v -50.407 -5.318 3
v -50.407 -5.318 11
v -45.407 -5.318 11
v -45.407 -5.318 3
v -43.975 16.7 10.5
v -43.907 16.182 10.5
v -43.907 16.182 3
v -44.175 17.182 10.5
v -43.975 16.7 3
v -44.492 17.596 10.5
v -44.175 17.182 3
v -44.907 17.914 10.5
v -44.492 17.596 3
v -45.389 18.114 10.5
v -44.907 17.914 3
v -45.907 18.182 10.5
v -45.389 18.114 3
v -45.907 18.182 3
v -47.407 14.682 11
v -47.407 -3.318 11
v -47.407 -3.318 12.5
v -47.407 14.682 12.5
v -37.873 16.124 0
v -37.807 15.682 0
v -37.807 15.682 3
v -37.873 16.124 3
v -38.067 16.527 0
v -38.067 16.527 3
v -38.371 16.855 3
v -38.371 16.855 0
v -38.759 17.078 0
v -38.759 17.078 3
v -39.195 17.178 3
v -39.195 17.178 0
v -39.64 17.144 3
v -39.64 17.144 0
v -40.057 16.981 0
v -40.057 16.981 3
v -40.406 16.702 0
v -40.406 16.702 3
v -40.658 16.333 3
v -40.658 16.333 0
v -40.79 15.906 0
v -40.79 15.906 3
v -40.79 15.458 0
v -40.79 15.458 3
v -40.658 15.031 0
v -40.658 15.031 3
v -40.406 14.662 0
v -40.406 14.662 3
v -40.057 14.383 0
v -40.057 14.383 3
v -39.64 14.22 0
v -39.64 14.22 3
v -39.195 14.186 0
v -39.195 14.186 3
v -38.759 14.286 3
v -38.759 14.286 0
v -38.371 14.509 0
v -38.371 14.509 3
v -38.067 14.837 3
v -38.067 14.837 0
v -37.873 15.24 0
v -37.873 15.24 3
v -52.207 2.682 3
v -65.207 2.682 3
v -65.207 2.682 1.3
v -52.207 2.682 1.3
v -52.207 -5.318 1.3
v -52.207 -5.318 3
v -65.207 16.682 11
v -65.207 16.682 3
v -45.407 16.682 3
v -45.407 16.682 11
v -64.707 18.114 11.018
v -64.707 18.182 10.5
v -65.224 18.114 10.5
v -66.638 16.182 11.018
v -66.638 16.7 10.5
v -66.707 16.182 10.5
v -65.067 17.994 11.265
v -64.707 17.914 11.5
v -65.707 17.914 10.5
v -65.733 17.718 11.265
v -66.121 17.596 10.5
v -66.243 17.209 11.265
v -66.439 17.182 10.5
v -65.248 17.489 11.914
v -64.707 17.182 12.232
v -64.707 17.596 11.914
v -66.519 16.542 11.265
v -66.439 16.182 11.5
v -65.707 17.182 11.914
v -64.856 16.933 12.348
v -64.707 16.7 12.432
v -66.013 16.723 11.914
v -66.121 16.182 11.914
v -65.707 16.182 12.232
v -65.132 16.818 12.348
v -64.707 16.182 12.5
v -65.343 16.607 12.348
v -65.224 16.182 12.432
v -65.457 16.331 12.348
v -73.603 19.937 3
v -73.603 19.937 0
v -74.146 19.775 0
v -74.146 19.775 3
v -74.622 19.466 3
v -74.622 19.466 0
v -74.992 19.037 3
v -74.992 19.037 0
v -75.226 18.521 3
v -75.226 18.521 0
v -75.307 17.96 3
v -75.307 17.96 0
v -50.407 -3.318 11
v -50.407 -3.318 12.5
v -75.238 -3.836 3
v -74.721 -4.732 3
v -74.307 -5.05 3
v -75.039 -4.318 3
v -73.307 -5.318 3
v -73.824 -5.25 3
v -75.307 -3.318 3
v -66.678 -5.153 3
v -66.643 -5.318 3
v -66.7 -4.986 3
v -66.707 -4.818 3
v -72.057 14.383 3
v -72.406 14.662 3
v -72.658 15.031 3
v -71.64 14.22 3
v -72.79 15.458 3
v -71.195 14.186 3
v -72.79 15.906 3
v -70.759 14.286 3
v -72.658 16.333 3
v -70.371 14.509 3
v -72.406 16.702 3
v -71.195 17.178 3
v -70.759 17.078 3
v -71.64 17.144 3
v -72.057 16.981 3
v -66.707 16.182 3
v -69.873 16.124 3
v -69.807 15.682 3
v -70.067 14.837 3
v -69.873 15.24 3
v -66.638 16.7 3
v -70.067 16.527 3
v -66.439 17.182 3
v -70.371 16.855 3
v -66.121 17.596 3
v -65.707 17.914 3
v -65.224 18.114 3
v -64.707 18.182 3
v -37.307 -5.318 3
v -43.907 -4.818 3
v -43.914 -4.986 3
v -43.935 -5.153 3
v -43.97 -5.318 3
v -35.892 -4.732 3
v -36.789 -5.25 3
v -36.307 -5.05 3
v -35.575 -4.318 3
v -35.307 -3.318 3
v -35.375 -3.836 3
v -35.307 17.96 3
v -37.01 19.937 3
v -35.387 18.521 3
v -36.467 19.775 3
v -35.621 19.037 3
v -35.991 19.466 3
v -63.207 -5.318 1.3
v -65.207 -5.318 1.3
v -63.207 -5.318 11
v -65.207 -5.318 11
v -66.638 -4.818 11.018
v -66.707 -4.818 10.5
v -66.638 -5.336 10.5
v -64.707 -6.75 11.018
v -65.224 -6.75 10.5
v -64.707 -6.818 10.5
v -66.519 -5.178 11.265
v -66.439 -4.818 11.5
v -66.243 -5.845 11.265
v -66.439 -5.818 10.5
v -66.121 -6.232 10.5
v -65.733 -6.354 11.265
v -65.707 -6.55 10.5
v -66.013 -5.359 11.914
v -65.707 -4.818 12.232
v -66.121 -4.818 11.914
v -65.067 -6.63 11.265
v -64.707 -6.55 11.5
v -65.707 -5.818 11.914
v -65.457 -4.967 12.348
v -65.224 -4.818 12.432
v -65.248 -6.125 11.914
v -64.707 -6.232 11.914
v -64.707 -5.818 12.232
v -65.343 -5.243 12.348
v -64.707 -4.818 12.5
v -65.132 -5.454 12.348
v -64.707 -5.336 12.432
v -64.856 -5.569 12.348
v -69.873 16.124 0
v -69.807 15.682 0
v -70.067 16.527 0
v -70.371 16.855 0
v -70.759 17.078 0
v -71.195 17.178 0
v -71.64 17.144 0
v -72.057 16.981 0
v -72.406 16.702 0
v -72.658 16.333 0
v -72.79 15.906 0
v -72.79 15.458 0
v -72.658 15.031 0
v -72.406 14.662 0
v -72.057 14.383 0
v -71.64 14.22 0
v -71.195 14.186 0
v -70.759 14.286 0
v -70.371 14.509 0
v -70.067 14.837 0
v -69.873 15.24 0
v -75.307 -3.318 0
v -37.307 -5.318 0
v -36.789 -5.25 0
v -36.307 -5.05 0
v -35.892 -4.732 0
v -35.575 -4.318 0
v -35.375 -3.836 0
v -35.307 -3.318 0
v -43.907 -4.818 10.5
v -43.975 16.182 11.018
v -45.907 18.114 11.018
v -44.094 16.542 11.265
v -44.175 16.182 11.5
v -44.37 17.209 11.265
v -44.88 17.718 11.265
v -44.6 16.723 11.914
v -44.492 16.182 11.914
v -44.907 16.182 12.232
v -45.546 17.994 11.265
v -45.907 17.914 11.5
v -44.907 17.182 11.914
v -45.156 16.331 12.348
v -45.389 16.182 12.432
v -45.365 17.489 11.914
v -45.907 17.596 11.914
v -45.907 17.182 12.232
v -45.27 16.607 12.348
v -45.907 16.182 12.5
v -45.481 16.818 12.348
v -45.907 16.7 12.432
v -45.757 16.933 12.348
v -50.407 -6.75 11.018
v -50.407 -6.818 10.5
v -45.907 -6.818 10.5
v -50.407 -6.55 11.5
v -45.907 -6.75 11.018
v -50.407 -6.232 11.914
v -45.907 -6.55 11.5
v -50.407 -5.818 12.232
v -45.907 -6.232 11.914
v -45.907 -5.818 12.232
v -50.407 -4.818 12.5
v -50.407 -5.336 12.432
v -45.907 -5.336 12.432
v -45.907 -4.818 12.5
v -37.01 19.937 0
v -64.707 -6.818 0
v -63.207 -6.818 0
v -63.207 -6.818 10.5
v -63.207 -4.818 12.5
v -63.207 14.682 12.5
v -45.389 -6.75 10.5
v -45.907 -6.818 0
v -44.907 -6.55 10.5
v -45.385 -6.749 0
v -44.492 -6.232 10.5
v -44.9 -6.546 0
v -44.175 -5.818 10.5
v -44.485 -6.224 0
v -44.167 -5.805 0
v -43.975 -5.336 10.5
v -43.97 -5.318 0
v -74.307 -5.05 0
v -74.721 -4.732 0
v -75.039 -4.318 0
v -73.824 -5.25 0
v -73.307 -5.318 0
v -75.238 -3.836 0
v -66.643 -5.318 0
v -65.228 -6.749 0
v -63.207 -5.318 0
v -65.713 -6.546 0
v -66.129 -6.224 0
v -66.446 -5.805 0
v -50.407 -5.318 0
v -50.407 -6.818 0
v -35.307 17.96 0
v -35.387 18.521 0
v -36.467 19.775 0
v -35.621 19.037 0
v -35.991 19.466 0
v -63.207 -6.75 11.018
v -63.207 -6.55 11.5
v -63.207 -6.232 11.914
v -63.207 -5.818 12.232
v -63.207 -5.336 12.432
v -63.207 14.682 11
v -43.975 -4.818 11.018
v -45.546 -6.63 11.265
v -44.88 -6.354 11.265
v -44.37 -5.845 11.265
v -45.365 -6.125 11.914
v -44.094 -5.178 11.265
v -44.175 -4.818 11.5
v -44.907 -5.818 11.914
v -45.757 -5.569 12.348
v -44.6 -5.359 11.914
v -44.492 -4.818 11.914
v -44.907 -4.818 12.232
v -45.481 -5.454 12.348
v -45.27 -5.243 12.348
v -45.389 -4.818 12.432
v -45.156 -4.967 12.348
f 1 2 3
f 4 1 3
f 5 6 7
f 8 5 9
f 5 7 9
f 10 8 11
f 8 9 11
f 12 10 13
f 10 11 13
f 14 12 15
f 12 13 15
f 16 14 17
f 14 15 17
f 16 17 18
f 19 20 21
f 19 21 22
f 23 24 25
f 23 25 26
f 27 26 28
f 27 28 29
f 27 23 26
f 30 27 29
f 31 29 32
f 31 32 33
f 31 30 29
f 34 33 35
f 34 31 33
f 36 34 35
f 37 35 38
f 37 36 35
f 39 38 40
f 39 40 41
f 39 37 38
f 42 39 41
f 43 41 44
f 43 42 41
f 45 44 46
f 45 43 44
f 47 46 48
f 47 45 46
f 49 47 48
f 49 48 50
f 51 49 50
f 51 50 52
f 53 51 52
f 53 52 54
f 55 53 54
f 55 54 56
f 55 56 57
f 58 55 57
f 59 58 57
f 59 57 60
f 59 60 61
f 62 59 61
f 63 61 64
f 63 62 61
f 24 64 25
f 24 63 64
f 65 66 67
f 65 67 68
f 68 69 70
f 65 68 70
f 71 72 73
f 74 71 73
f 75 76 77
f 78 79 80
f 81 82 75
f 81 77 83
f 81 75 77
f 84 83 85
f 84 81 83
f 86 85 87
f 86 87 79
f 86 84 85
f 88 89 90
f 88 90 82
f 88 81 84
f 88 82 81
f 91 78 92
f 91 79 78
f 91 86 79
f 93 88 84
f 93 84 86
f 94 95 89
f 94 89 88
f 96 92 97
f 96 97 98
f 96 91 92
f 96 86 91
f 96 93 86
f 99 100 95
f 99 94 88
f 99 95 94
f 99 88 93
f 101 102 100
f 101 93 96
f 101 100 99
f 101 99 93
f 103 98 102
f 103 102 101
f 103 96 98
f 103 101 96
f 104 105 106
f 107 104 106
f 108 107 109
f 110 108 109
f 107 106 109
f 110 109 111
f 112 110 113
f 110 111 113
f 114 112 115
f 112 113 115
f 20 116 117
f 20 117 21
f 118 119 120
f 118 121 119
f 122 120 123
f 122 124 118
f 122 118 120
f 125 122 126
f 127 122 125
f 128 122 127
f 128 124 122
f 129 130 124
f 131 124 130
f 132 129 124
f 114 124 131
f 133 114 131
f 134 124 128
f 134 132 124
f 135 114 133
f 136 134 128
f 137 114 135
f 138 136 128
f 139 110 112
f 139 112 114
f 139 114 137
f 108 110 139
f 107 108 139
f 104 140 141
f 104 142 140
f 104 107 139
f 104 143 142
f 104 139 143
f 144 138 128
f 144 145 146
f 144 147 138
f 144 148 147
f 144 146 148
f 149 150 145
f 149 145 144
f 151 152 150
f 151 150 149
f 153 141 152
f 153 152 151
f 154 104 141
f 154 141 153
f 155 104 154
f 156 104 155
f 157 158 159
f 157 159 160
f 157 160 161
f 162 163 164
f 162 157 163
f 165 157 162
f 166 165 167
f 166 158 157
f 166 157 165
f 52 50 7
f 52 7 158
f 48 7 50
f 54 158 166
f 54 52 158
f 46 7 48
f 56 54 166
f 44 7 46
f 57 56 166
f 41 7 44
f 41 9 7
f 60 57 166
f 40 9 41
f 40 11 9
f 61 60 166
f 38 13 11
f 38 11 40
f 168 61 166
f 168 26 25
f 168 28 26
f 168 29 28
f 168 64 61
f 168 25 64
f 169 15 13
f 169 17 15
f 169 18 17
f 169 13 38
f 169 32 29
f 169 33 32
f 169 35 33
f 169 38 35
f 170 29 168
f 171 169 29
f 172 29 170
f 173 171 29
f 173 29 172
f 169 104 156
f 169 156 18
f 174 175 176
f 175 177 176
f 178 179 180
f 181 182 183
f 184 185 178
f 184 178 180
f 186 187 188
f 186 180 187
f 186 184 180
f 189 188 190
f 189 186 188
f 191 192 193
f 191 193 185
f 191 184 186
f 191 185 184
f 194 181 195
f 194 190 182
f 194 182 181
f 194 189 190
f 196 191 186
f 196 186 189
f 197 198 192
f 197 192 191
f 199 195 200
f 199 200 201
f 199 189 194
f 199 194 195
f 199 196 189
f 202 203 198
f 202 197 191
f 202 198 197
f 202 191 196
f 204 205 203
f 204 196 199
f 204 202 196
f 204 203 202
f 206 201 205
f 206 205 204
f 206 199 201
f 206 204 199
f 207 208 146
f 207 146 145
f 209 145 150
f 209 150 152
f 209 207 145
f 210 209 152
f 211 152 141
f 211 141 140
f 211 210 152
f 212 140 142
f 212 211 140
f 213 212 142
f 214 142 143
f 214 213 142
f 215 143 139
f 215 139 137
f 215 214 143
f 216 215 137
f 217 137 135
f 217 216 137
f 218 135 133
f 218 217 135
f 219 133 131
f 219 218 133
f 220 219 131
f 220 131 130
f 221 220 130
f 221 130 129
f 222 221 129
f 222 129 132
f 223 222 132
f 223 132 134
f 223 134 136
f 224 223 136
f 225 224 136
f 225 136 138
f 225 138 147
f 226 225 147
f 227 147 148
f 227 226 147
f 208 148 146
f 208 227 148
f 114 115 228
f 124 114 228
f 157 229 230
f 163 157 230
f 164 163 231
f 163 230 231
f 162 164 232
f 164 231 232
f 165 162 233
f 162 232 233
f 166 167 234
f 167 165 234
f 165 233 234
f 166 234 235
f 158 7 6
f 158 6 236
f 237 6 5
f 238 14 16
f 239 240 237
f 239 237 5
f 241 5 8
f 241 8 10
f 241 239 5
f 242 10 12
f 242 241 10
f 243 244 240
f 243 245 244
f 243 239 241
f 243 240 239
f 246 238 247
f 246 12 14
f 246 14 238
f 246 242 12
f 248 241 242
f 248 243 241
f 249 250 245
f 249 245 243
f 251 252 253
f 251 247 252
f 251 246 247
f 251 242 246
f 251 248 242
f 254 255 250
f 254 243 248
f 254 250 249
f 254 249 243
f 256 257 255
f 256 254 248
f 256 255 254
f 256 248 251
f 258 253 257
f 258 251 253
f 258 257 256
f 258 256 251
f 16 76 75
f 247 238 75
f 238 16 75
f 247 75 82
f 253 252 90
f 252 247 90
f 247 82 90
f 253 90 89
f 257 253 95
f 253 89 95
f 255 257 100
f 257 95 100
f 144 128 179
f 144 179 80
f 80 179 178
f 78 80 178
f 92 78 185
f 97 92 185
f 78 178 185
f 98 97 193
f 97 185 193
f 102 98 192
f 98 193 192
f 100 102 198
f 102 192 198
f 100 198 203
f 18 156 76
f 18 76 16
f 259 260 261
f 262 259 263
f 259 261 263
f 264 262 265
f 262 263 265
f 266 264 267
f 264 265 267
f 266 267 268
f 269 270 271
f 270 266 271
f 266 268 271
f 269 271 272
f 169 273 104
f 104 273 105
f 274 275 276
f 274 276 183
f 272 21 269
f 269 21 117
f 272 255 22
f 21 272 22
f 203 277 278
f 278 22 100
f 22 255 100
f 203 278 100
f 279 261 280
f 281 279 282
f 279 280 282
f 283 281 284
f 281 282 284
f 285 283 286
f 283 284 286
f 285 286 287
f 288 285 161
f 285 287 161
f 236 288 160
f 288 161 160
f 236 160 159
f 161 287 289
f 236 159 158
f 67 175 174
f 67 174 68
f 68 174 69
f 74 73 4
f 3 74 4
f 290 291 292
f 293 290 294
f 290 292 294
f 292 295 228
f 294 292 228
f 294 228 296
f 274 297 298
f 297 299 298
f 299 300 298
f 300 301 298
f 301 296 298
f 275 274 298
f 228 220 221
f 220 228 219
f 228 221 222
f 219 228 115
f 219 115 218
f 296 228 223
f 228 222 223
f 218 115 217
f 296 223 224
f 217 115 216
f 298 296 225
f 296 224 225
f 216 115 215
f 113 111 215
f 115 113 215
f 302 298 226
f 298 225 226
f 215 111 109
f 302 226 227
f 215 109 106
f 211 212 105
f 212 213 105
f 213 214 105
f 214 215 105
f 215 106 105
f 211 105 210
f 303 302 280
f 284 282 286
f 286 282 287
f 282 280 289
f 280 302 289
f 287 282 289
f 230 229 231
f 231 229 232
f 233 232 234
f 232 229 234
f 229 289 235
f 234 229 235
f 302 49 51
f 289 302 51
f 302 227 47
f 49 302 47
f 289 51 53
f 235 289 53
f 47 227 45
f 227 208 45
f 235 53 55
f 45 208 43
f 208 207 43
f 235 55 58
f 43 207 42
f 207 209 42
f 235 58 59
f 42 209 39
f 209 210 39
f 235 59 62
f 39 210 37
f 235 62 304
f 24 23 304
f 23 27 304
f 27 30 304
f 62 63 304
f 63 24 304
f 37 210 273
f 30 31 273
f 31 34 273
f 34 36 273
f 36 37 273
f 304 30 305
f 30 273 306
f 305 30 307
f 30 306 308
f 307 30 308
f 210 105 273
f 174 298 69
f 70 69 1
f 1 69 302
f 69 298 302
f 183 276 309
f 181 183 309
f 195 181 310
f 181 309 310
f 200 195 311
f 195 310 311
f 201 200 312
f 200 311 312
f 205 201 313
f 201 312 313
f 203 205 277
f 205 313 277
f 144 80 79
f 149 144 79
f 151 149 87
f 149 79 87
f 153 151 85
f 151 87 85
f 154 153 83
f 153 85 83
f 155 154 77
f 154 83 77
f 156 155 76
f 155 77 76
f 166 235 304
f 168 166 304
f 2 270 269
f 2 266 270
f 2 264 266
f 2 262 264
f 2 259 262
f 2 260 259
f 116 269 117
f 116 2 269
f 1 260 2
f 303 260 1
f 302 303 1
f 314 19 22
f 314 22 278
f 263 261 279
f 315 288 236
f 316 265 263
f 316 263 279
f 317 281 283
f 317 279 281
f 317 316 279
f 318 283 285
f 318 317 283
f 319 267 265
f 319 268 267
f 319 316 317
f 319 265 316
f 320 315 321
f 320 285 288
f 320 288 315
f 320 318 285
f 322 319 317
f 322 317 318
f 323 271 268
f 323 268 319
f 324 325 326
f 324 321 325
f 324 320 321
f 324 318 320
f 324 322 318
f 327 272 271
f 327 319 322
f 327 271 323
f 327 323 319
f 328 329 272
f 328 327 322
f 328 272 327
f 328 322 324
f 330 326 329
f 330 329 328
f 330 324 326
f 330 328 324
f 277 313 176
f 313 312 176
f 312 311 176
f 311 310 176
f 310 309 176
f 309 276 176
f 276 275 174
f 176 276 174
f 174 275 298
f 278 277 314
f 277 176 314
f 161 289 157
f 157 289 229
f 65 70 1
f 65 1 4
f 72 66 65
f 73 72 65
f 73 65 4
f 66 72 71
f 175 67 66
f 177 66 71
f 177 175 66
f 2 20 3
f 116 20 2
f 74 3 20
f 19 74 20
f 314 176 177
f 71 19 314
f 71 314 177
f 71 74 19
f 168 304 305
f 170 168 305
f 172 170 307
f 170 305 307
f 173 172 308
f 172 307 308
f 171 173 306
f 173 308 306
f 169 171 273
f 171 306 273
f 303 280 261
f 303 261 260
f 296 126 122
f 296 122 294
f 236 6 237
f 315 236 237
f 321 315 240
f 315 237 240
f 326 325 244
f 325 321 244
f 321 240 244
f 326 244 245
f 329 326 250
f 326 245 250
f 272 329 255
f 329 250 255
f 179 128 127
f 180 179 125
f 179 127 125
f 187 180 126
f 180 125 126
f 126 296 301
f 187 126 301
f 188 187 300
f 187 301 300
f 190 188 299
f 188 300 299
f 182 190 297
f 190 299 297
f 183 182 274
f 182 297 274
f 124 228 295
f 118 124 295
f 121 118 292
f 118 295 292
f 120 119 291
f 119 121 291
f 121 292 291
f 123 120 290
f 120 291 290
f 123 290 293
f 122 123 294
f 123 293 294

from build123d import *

# Parameters (mm, degrees)
CROQUIS1_R              = 1.5
SALIENTE_EXTRUIR1_DEPTH = 3
SALIENTE_EXTRUIR2_DEPTH = 8
CROQUIS3_W              = 13
CROQUIS3_H              = 1.7
CORTAR_EXTRUIR1_DEPTH   = 8
CROQUIS5_W              = 3.5
CROQUIS5_H              = 11
CROQUIS5_W_2            = 6.5
SALIENTE_EXTRUIR3_DEPTH = 1.5
SALIENTE_EXTRUIR4_DEPTH = 1.5
REDONDEO1_R             = 2


with BuildPart() as part:
    # Croquis1 → Saliente-Extruir1 (new body)
    with BuildSketch(Plane.XY):
        with BuildLine():
            Line((-75.306602598, 17.959617496), (-75.306602598, -5.318007663))
            Line((-75.306602598, -5.318007663), (-35.306602598, -5.318007663))
            Line((-35.306602598, -5.318007663), (-35.306602598, 17.959617496))
            ThreePointArc((-35.306602598, 17.959617496), (-35.791122177, 19.26473017), (-37.009921692, 19.937490201))
            Line((-37.009921692, 19.937490201), (-73.603283504, 19.937490201))
            ThreePointArc((-73.603283504, 19.937490201), (-74.822083019, 19.26473017), (-75.306602598, 17.959617496))
        make_face()
        with Locations((-71.306602598, 15.681992337)):
            Circle(CROQUIS1_R, mode=Mode.SUBTRACT)
        with Locations((-39.306602598, 15.681992337)):
            Circle(CROQUIS1_R, mode=Mode.SUBTRACT)
    extrude(amount=SALIENTE_EXTRUIR1_DEPTH)

    # Croquis2 → Saliente-Extruir2 (add)
    with BuildSketch(Plane.XY.offset(3)):
        Polygon((-66.706602598, -5.318007663), (-65.206602598, -5.318007663), (-65.206602598, 16.681992337), (-45.406602598, 16.681992337), (-45.406602598, -5.318007663), (-43.906602598, -5.318007663), (-43.906602598, 18.181992337), (-66.706602598, 18.181992337), align=None)
    extrude(amount=SALIENTE_EXTRUIR2_DEPTH)

    # Croquis3 → Cortar-Extruir1 (cut)
    with BuildSketch(Plane.XZ.offset(5.318007663)):
        with Locations((-58.706602598, 2.15)):
            Rectangle(CROQUIS3_W, CROQUIS3_H)
    extrude(amount=-CORTAR_EXTRUIR1_DEPTH, mode=Mode.SUBTRACT)

    # Croquis5 → Saliente-Extruir3 (add)
    with BuildSketch(Plane.XZ.offset(5.318007663)):
        with Locations((-64.956602598, 5.5)):
            Rectangle(CROQUIS5_W, CROQUIS5_H)
        with Locations((-47.156602598, 5.5)):
            Rectangle(CROQUIS5_W_2, CROQUIS5_H)
    extrude(amount=SALIENTE_EXTRUIR3_DEPTH)

    # Croquis6 → Saliente-Extruir4 (add)
    with BuildSketch(Plane.XY.offset(11)):
        Polygon((-63.206602598, -5.318007663), (-63.206602598, -6.818007663), (-66.706602598, -6.818007663), (-66.706602598, 18.181992337), (-43.906602598, 18.181992337), (-43.906602598, -6.818007663), (-50.406602598, -6.818007663), (-50.406602598, -3.318007663), (-47.406602598, -3.318007663), (-47.406602598, 14.681992337), (-63.206602598, 14.681992337), align=None)
    extrude(amount=SALIENTE_EXTRUIR4_DEPTH)

    # Redondeo1
    # the kernel refuses this fillet: 2 mm, written as the material it takes off along each edge
    with BuildSketch(Plane(origin=(-45.906602598, -4.818007663, 10.5), x_dir=(1, 0, 0), z_dir=(0, 0, 1))) as redondeo1_piece_1_section:
        Polygon((0, 0), (REDONDEO1_R * 1.02, 0), (REDONDEO1_R * 1.02, -REDONDEO1_R * 1.02), (0, -REDONDEO1_R * 1.02), align=None)
    redondeo1_piece_1 = extrude(amount=REDONDEO1_R * 1.02, mode=Mode.PRIVATE)
    redondeo1_piece_1 = redondeo1_piece_1 - Plane(origin=(-45.906602598, -4.818007663, 10.5), x_dir=(-0.7071067811865477, 0.7071067811865474, 0), z_dir=(0, 0, 1)) * Sphere(REDONDEO1_R, mode=Mode.PRIVATE)
    add(redondeo1_piece_1, mode=Mode.SUBTRACT)
    with BuildSketch(Plane(origin=(-45.906602598, 16.181992337, 10.5), x_dir=(0, 1, 0), z_dir=(0, 0, 1))) as redondeo1_piece_2_section:
        Polygon((0, 0), (REDONDEO1_R * 1.02, 0), (REDONDEO1_R * 1.02, -REDONDEO1_R * 1.02), (0, -REDONDEO1_R * 1.02), align=None)
    redondeo1_piece_2 = extrude(amount=REDONDEO1_R * 1.02, mode=Mode.PRIVATE)
    redondeo1_piece_2 = redondeo1_piece_2 - Plane(origin=(-45.906602598, 16.181992337, 10.5), x_dir=(-0.7071067811865471, -0.7071067811865477, 0), z_dir=(0, 0, 1)) * Sphere(REDONDEO1_R, mode=Mode.PRIVATE)
    add(redondeo1_piece_2, mode=Mode.SUBTRACT)
    with BuildSketch(Plane(origin=(-64.706602598, 16.181992337, 10.5), x_dir=(0, 1, 0), z_dir=(0, 0, 1))) as redondeo1_piece_3_section:
        Polygon((0, 0), (REDONDEO1_R * 1.02, 0), (REDONDEO1_R * 1.02, REDONDEO1_R * 1.02), (0, REDONDEO1_R * 1.02), align=None)
    redondeo1_piece_3 = extrude(amount=REDONDEO1_R * 1.02, mode=Mode.PRIVATE)
    redondeo1_piece_3 = redondeo1_piece_3 - Plane(origin=(-64.706602598, 16.181992337, 10.5), x_dir=(0.7071067811865477, -0.7071067811865475, 0), z_dir=(0, 0, 1)) * Sphere(REDONDEO1_R, mode=Mode.PRIVATE)
    add(redondeo1_piece_3, mode=Mode.SUBTRACT)
    with BuildSketch(Plane(origin=(-64.706602598, -4.818007663, 10.5), x_dir=(-1, 0, 0), z_dir=(0, 0, 1))) as redondeo1_piece_4_section:
        Polygon((0, 0), (REDONDEO1_R * 1.02, 0), (REDONDEO1_R * 1.02, REDONDEO1_R * 1.02), (0, REDONDEO1_R * 1.02), align=None)
    redondeo1_piece_4 = extrude(amount=REDONDEO1_R * 1.02, mode=Mode.PRIVATE)
    redondeo1_piece_4 = redondeo1_piece_4 - Plane(origin=(-64.706602598, -4.818007663, 10.5), x_dir=(0.7071067811865475, 0.7071067811865475, 0), z_dir=(0, 0, 1)) * Sphere(REDONDEO1_R, mode=Mode.PRIVATE)
    add(redondeo1_piece_4, mode=Mode.SUBTRACT)
    with BuildSketch(Plane(origin=(-35.306602598, -5.318007663, -5), x_dir=(-1, 0, 0), z_dir=(0, 0, 1))) as redondeo1_piece_5:
        with BuildLine():
            CenterArc((REDONDEO1_R, -REDONDEO1_R), REDONDEO1_R, 90, 90)
            Line((0, -REDONDEO1_R), (0, 0))
            Line((0, 0), (REDONDEO1_R, 0))
        make_face()
    extrude(amount=13, mode=Mode.SUBTRACT)
    with BuildSketch(Plane(origin=(-45.906602598, -6.818007663, 12.5), x_dir=(0, 0, -1), z_dir=(-1, 0, 0))) as redondeo1_piece_6:
        with BuildLine():
            CenterArc((REDONDEO1_R, -REDONDEO1_R), REDONDEO1_R, 90, 90)
            Line((0, -REDONDEO1_R), (0, 0))
            Line((0, 0), (REDONDEO1_R, 0))
        make_face()
    extrude(amount=9.5, mode=Mode.SUBTRACT)
    with BuildSketch(Plane(origin=(-43.906602598, 16.181992337, 12.5), x_dir=(-1, 0, 0), z_dir=(0, -1, 0))) as redondeo1_piece_7:
        with BuildLine():
            CenterArc((REDONDEO1_R, REDONDEO1_R), REDONDEO1_R, 180, 90)
            Line((0, REDONDEO1_R), (0, 0))
            Line((0, 0), (REDONDEO1_R, 0))
        make_face()
    extrude(amount=21, mode=Mode.SUBTRACT)
    with BuildSketch(Plane(origin=(-64.706602598, 18.181992337, 12.5), x_dir=(0, -1, 0), z_dir=(1, 0, 0))) as redondeo1_piece_8:
        with BuildLine():
            CenterArc((REDONDEO1_R, REDONDEO1_R), REDONDEO1_R, 180, 90)
            Line((0, REDONDEO1_R), (0, 0))
            Line((0, 0), (REDONDEO1_R, 0))
        make_face()
    extrude(amount=18.8, mode=Mode.SUBTRACT)
    with BuildSketch(Plane(origin=(-75.306602598, -5.318007663, -5), x_dir=(1, 0, 0), z_dir=(0, 0, 1))) as redondeo1_piece_9:
        with BuildLine():
            CenterArc((REDONDEO1_R, REDONDEO1_R), REDONDEO1_R, 180, 90)
            Line((0, REDONDEO1_R), (0, 0))
            Line((0, 0), (REDONDEO1_R, 0))
        make_face()
    extrude(amount=13, mode=Mode.SUBTRACT)
    with BuildSketch(Plane(origin=(-66.706602598, -4.818007663, 12.5), x_dir=(0, 0, -1), z_dir=(0, 1, 0))) as redondeo1_piece_10:
        with BuildLine():
            CenterArc((REDONDEO1_R, -REDONDEO1_R), REDONDEO1_R, 90, 90)
            Line((0, -REDONDEO1_R), (0, 0))
            Line((0, 0), (REDONDEO1_R, 0))
        make_face()
    extrude(amount=21, mode=Mode.SUBTRACT)
    with BuildSketch(Plane(origin=(-58.206602598, -6.818007663, 12.5), x_dir=(0, 0, -1), z_dir=(-1, 0, 0))) as redondeo1_piece_11:
        with BuildLine():
            CenterArc((REDONDEO1_R, -REDONDEO1_R), REDONDEO1_R, 90, 90)
            Line((0, -REDONDEO1_R), (0, 0))
            Line((0, 0), (REDONDEO1_R, 0))
        make_face()
    extrude(amount=6.5, mode=Mode.SUBTRACT)
    with BuildSketch(Plane(origin=(-66.706602598, 18.181992337, 10.5), x_dir=(0, -1, 0), z_dir=(0, 0, -1))) as redondeo1_piece_12:
        with BuildLine():
            CenterArc((REDONDEO1_R, -REDONDEO1_R), REDONDEO1_R, 90, 90)
            Line((0, -REDONDEO1_R), (0, 0))
            Line((0, 0), (REDONDEO1_R, 0))
        make_face()
    extrude(amount=7.5, mode=Mode.SUBTRACT)
    with BuildSketch(Plane(origin=(-43.906602598, 18.181992337, 3), x_dir=(-1, 0, 0), z_dir=(0, 0, 1))) as redondeo1_piece_13:
        with BuildLine():
            CenterArc((REDONDEO1_R, REDONDEO1_R), REDONDEO1_R, 180, 90)
            Line((0, REDONDEO1_R), (0, 0))
            Line((0, 0), (REDONDEO1_R, 0))
        make_face()
    extrude(amount=7.5, mode=Mode.SUBTRACT)
    with BuildSketch(Plane(origin=(-66.706602598, -6.818007663, -5), x_dir=(0, 1, 0), z_dir=(0, 0, 1))) as redondeo1_piece_14_section:
        with BuildLine():
            CenterArc((REDONDEO1_R, -REDONDEO1_R), REDONDEO1_R, 90, 90)
            Line((0, -REDONDEO1_R), (0, 0))
            Line((0, 0), (REDONDEO1_R, 0))
        make_face()
    redondeo1_piece_14 = extrude(amount=15.5, mode=Mode.PRIVATE)
    redondeo1_piece_14 = split(redondeo1_piece_14, bisect_by=Plane(origin=(-66.254561414, -5.318007663, 1.5), z_dir=(0, -1, 0)), keep=Keep.TOP, mode=Mode.PRIVATE)
    add(redondeo1_piece_14, mode=Mode.SUBTRACT)
    with BuildSketch(Plane(origin=(-66.706602598, -6.818007663, -5), x_dir=(0, 1, 0), z_dir=(0, 0, 1))) as redondeo1_piece_15_section:
        with BuildLine():
            CenterArc((REDONDEO1_R, -REDONDEO1_R), REDONDEO1_R, 90, 90)
            Line((0, -REDONDEO1_R), (0, 0))
            Line((0, 0), (REDONDEO1_R, 0))
        make_face()
    redondeo1_piece_15 = extrude(amount=15.5, mode=Mode.PRIVATE)
    redondeo1_piece_15 = split(redondeo1_piece_15, bisect_by=Plane(origin=(-66.687603103, -5.193408024, 3), z_dir=(0, 0, 1)), keep=Keep.TOP, mode=Mode.PRIVATE)
    add(redondeo1_piece_15, mode=Mode.SUBTRACT)
    with BuildSketch(Plane(origin=(-43.906602598, -6.818007663, -5), x_dir=(-1, 0, 0), z_dir=(0, 0, 1))) as redondeo1_piece_16_section:
        with BuildLine():
            CenterArc((REDONDEO1_R, -REDONDEO1_R), REDONDEO1_R, 90, 90)
            Line((0, -REDONDEO1_R), (0, 0))
            Line((0, 0), (REDONDEO1_R, 0))
        make_face()
    redondeo1_piece_16 = extrude(amount=15.5, mode=Mode.PRIVATE)
    redondeo1_piece_16 = split(redondeo1_piece_16, bisect_by=Plane(origin=(-44.358643782, -5.318007663, 1.5), z_dir=(0, -1, 0)), keep=Keep.TOP, mode=Mode.PRIVATE)
    add(redondeo1_piece_16, mode=Mode.SUBTRACT)
    with BuildSketch(Plane(origin=(-43.906602598, -6.818007663, -5), x_dir=(-1, 0, 0), z_dir=(0, 0, 1))) as redondeo1_piece_17_section:
        with BuildLine():
            CenterArc((REDONDEO1_R, -REDONDEO1_R), REDONDEO1_R, 90, 90)
            Line((0, -REDONDEO1_R), (0, 0))
            Line((0, 0), (REDONDEO1_R, 0))
        make_face()
    redondeo1_piece_17 = extrude(amount=15.5, mode=Mode.PRIVATE)
    redondeo1_piece_17 = split(redondeo1_piece_17, bisect_by=Plane(origin=(-43.925602093, -5.193408024, 3), z_dir=(0, 0, 1)), keep=Keep.TOP, mode=Mode.PRIVATE)
    add(redondeo1_piece_17, mode=Mode.SUBTRACT)


solid = part.part
